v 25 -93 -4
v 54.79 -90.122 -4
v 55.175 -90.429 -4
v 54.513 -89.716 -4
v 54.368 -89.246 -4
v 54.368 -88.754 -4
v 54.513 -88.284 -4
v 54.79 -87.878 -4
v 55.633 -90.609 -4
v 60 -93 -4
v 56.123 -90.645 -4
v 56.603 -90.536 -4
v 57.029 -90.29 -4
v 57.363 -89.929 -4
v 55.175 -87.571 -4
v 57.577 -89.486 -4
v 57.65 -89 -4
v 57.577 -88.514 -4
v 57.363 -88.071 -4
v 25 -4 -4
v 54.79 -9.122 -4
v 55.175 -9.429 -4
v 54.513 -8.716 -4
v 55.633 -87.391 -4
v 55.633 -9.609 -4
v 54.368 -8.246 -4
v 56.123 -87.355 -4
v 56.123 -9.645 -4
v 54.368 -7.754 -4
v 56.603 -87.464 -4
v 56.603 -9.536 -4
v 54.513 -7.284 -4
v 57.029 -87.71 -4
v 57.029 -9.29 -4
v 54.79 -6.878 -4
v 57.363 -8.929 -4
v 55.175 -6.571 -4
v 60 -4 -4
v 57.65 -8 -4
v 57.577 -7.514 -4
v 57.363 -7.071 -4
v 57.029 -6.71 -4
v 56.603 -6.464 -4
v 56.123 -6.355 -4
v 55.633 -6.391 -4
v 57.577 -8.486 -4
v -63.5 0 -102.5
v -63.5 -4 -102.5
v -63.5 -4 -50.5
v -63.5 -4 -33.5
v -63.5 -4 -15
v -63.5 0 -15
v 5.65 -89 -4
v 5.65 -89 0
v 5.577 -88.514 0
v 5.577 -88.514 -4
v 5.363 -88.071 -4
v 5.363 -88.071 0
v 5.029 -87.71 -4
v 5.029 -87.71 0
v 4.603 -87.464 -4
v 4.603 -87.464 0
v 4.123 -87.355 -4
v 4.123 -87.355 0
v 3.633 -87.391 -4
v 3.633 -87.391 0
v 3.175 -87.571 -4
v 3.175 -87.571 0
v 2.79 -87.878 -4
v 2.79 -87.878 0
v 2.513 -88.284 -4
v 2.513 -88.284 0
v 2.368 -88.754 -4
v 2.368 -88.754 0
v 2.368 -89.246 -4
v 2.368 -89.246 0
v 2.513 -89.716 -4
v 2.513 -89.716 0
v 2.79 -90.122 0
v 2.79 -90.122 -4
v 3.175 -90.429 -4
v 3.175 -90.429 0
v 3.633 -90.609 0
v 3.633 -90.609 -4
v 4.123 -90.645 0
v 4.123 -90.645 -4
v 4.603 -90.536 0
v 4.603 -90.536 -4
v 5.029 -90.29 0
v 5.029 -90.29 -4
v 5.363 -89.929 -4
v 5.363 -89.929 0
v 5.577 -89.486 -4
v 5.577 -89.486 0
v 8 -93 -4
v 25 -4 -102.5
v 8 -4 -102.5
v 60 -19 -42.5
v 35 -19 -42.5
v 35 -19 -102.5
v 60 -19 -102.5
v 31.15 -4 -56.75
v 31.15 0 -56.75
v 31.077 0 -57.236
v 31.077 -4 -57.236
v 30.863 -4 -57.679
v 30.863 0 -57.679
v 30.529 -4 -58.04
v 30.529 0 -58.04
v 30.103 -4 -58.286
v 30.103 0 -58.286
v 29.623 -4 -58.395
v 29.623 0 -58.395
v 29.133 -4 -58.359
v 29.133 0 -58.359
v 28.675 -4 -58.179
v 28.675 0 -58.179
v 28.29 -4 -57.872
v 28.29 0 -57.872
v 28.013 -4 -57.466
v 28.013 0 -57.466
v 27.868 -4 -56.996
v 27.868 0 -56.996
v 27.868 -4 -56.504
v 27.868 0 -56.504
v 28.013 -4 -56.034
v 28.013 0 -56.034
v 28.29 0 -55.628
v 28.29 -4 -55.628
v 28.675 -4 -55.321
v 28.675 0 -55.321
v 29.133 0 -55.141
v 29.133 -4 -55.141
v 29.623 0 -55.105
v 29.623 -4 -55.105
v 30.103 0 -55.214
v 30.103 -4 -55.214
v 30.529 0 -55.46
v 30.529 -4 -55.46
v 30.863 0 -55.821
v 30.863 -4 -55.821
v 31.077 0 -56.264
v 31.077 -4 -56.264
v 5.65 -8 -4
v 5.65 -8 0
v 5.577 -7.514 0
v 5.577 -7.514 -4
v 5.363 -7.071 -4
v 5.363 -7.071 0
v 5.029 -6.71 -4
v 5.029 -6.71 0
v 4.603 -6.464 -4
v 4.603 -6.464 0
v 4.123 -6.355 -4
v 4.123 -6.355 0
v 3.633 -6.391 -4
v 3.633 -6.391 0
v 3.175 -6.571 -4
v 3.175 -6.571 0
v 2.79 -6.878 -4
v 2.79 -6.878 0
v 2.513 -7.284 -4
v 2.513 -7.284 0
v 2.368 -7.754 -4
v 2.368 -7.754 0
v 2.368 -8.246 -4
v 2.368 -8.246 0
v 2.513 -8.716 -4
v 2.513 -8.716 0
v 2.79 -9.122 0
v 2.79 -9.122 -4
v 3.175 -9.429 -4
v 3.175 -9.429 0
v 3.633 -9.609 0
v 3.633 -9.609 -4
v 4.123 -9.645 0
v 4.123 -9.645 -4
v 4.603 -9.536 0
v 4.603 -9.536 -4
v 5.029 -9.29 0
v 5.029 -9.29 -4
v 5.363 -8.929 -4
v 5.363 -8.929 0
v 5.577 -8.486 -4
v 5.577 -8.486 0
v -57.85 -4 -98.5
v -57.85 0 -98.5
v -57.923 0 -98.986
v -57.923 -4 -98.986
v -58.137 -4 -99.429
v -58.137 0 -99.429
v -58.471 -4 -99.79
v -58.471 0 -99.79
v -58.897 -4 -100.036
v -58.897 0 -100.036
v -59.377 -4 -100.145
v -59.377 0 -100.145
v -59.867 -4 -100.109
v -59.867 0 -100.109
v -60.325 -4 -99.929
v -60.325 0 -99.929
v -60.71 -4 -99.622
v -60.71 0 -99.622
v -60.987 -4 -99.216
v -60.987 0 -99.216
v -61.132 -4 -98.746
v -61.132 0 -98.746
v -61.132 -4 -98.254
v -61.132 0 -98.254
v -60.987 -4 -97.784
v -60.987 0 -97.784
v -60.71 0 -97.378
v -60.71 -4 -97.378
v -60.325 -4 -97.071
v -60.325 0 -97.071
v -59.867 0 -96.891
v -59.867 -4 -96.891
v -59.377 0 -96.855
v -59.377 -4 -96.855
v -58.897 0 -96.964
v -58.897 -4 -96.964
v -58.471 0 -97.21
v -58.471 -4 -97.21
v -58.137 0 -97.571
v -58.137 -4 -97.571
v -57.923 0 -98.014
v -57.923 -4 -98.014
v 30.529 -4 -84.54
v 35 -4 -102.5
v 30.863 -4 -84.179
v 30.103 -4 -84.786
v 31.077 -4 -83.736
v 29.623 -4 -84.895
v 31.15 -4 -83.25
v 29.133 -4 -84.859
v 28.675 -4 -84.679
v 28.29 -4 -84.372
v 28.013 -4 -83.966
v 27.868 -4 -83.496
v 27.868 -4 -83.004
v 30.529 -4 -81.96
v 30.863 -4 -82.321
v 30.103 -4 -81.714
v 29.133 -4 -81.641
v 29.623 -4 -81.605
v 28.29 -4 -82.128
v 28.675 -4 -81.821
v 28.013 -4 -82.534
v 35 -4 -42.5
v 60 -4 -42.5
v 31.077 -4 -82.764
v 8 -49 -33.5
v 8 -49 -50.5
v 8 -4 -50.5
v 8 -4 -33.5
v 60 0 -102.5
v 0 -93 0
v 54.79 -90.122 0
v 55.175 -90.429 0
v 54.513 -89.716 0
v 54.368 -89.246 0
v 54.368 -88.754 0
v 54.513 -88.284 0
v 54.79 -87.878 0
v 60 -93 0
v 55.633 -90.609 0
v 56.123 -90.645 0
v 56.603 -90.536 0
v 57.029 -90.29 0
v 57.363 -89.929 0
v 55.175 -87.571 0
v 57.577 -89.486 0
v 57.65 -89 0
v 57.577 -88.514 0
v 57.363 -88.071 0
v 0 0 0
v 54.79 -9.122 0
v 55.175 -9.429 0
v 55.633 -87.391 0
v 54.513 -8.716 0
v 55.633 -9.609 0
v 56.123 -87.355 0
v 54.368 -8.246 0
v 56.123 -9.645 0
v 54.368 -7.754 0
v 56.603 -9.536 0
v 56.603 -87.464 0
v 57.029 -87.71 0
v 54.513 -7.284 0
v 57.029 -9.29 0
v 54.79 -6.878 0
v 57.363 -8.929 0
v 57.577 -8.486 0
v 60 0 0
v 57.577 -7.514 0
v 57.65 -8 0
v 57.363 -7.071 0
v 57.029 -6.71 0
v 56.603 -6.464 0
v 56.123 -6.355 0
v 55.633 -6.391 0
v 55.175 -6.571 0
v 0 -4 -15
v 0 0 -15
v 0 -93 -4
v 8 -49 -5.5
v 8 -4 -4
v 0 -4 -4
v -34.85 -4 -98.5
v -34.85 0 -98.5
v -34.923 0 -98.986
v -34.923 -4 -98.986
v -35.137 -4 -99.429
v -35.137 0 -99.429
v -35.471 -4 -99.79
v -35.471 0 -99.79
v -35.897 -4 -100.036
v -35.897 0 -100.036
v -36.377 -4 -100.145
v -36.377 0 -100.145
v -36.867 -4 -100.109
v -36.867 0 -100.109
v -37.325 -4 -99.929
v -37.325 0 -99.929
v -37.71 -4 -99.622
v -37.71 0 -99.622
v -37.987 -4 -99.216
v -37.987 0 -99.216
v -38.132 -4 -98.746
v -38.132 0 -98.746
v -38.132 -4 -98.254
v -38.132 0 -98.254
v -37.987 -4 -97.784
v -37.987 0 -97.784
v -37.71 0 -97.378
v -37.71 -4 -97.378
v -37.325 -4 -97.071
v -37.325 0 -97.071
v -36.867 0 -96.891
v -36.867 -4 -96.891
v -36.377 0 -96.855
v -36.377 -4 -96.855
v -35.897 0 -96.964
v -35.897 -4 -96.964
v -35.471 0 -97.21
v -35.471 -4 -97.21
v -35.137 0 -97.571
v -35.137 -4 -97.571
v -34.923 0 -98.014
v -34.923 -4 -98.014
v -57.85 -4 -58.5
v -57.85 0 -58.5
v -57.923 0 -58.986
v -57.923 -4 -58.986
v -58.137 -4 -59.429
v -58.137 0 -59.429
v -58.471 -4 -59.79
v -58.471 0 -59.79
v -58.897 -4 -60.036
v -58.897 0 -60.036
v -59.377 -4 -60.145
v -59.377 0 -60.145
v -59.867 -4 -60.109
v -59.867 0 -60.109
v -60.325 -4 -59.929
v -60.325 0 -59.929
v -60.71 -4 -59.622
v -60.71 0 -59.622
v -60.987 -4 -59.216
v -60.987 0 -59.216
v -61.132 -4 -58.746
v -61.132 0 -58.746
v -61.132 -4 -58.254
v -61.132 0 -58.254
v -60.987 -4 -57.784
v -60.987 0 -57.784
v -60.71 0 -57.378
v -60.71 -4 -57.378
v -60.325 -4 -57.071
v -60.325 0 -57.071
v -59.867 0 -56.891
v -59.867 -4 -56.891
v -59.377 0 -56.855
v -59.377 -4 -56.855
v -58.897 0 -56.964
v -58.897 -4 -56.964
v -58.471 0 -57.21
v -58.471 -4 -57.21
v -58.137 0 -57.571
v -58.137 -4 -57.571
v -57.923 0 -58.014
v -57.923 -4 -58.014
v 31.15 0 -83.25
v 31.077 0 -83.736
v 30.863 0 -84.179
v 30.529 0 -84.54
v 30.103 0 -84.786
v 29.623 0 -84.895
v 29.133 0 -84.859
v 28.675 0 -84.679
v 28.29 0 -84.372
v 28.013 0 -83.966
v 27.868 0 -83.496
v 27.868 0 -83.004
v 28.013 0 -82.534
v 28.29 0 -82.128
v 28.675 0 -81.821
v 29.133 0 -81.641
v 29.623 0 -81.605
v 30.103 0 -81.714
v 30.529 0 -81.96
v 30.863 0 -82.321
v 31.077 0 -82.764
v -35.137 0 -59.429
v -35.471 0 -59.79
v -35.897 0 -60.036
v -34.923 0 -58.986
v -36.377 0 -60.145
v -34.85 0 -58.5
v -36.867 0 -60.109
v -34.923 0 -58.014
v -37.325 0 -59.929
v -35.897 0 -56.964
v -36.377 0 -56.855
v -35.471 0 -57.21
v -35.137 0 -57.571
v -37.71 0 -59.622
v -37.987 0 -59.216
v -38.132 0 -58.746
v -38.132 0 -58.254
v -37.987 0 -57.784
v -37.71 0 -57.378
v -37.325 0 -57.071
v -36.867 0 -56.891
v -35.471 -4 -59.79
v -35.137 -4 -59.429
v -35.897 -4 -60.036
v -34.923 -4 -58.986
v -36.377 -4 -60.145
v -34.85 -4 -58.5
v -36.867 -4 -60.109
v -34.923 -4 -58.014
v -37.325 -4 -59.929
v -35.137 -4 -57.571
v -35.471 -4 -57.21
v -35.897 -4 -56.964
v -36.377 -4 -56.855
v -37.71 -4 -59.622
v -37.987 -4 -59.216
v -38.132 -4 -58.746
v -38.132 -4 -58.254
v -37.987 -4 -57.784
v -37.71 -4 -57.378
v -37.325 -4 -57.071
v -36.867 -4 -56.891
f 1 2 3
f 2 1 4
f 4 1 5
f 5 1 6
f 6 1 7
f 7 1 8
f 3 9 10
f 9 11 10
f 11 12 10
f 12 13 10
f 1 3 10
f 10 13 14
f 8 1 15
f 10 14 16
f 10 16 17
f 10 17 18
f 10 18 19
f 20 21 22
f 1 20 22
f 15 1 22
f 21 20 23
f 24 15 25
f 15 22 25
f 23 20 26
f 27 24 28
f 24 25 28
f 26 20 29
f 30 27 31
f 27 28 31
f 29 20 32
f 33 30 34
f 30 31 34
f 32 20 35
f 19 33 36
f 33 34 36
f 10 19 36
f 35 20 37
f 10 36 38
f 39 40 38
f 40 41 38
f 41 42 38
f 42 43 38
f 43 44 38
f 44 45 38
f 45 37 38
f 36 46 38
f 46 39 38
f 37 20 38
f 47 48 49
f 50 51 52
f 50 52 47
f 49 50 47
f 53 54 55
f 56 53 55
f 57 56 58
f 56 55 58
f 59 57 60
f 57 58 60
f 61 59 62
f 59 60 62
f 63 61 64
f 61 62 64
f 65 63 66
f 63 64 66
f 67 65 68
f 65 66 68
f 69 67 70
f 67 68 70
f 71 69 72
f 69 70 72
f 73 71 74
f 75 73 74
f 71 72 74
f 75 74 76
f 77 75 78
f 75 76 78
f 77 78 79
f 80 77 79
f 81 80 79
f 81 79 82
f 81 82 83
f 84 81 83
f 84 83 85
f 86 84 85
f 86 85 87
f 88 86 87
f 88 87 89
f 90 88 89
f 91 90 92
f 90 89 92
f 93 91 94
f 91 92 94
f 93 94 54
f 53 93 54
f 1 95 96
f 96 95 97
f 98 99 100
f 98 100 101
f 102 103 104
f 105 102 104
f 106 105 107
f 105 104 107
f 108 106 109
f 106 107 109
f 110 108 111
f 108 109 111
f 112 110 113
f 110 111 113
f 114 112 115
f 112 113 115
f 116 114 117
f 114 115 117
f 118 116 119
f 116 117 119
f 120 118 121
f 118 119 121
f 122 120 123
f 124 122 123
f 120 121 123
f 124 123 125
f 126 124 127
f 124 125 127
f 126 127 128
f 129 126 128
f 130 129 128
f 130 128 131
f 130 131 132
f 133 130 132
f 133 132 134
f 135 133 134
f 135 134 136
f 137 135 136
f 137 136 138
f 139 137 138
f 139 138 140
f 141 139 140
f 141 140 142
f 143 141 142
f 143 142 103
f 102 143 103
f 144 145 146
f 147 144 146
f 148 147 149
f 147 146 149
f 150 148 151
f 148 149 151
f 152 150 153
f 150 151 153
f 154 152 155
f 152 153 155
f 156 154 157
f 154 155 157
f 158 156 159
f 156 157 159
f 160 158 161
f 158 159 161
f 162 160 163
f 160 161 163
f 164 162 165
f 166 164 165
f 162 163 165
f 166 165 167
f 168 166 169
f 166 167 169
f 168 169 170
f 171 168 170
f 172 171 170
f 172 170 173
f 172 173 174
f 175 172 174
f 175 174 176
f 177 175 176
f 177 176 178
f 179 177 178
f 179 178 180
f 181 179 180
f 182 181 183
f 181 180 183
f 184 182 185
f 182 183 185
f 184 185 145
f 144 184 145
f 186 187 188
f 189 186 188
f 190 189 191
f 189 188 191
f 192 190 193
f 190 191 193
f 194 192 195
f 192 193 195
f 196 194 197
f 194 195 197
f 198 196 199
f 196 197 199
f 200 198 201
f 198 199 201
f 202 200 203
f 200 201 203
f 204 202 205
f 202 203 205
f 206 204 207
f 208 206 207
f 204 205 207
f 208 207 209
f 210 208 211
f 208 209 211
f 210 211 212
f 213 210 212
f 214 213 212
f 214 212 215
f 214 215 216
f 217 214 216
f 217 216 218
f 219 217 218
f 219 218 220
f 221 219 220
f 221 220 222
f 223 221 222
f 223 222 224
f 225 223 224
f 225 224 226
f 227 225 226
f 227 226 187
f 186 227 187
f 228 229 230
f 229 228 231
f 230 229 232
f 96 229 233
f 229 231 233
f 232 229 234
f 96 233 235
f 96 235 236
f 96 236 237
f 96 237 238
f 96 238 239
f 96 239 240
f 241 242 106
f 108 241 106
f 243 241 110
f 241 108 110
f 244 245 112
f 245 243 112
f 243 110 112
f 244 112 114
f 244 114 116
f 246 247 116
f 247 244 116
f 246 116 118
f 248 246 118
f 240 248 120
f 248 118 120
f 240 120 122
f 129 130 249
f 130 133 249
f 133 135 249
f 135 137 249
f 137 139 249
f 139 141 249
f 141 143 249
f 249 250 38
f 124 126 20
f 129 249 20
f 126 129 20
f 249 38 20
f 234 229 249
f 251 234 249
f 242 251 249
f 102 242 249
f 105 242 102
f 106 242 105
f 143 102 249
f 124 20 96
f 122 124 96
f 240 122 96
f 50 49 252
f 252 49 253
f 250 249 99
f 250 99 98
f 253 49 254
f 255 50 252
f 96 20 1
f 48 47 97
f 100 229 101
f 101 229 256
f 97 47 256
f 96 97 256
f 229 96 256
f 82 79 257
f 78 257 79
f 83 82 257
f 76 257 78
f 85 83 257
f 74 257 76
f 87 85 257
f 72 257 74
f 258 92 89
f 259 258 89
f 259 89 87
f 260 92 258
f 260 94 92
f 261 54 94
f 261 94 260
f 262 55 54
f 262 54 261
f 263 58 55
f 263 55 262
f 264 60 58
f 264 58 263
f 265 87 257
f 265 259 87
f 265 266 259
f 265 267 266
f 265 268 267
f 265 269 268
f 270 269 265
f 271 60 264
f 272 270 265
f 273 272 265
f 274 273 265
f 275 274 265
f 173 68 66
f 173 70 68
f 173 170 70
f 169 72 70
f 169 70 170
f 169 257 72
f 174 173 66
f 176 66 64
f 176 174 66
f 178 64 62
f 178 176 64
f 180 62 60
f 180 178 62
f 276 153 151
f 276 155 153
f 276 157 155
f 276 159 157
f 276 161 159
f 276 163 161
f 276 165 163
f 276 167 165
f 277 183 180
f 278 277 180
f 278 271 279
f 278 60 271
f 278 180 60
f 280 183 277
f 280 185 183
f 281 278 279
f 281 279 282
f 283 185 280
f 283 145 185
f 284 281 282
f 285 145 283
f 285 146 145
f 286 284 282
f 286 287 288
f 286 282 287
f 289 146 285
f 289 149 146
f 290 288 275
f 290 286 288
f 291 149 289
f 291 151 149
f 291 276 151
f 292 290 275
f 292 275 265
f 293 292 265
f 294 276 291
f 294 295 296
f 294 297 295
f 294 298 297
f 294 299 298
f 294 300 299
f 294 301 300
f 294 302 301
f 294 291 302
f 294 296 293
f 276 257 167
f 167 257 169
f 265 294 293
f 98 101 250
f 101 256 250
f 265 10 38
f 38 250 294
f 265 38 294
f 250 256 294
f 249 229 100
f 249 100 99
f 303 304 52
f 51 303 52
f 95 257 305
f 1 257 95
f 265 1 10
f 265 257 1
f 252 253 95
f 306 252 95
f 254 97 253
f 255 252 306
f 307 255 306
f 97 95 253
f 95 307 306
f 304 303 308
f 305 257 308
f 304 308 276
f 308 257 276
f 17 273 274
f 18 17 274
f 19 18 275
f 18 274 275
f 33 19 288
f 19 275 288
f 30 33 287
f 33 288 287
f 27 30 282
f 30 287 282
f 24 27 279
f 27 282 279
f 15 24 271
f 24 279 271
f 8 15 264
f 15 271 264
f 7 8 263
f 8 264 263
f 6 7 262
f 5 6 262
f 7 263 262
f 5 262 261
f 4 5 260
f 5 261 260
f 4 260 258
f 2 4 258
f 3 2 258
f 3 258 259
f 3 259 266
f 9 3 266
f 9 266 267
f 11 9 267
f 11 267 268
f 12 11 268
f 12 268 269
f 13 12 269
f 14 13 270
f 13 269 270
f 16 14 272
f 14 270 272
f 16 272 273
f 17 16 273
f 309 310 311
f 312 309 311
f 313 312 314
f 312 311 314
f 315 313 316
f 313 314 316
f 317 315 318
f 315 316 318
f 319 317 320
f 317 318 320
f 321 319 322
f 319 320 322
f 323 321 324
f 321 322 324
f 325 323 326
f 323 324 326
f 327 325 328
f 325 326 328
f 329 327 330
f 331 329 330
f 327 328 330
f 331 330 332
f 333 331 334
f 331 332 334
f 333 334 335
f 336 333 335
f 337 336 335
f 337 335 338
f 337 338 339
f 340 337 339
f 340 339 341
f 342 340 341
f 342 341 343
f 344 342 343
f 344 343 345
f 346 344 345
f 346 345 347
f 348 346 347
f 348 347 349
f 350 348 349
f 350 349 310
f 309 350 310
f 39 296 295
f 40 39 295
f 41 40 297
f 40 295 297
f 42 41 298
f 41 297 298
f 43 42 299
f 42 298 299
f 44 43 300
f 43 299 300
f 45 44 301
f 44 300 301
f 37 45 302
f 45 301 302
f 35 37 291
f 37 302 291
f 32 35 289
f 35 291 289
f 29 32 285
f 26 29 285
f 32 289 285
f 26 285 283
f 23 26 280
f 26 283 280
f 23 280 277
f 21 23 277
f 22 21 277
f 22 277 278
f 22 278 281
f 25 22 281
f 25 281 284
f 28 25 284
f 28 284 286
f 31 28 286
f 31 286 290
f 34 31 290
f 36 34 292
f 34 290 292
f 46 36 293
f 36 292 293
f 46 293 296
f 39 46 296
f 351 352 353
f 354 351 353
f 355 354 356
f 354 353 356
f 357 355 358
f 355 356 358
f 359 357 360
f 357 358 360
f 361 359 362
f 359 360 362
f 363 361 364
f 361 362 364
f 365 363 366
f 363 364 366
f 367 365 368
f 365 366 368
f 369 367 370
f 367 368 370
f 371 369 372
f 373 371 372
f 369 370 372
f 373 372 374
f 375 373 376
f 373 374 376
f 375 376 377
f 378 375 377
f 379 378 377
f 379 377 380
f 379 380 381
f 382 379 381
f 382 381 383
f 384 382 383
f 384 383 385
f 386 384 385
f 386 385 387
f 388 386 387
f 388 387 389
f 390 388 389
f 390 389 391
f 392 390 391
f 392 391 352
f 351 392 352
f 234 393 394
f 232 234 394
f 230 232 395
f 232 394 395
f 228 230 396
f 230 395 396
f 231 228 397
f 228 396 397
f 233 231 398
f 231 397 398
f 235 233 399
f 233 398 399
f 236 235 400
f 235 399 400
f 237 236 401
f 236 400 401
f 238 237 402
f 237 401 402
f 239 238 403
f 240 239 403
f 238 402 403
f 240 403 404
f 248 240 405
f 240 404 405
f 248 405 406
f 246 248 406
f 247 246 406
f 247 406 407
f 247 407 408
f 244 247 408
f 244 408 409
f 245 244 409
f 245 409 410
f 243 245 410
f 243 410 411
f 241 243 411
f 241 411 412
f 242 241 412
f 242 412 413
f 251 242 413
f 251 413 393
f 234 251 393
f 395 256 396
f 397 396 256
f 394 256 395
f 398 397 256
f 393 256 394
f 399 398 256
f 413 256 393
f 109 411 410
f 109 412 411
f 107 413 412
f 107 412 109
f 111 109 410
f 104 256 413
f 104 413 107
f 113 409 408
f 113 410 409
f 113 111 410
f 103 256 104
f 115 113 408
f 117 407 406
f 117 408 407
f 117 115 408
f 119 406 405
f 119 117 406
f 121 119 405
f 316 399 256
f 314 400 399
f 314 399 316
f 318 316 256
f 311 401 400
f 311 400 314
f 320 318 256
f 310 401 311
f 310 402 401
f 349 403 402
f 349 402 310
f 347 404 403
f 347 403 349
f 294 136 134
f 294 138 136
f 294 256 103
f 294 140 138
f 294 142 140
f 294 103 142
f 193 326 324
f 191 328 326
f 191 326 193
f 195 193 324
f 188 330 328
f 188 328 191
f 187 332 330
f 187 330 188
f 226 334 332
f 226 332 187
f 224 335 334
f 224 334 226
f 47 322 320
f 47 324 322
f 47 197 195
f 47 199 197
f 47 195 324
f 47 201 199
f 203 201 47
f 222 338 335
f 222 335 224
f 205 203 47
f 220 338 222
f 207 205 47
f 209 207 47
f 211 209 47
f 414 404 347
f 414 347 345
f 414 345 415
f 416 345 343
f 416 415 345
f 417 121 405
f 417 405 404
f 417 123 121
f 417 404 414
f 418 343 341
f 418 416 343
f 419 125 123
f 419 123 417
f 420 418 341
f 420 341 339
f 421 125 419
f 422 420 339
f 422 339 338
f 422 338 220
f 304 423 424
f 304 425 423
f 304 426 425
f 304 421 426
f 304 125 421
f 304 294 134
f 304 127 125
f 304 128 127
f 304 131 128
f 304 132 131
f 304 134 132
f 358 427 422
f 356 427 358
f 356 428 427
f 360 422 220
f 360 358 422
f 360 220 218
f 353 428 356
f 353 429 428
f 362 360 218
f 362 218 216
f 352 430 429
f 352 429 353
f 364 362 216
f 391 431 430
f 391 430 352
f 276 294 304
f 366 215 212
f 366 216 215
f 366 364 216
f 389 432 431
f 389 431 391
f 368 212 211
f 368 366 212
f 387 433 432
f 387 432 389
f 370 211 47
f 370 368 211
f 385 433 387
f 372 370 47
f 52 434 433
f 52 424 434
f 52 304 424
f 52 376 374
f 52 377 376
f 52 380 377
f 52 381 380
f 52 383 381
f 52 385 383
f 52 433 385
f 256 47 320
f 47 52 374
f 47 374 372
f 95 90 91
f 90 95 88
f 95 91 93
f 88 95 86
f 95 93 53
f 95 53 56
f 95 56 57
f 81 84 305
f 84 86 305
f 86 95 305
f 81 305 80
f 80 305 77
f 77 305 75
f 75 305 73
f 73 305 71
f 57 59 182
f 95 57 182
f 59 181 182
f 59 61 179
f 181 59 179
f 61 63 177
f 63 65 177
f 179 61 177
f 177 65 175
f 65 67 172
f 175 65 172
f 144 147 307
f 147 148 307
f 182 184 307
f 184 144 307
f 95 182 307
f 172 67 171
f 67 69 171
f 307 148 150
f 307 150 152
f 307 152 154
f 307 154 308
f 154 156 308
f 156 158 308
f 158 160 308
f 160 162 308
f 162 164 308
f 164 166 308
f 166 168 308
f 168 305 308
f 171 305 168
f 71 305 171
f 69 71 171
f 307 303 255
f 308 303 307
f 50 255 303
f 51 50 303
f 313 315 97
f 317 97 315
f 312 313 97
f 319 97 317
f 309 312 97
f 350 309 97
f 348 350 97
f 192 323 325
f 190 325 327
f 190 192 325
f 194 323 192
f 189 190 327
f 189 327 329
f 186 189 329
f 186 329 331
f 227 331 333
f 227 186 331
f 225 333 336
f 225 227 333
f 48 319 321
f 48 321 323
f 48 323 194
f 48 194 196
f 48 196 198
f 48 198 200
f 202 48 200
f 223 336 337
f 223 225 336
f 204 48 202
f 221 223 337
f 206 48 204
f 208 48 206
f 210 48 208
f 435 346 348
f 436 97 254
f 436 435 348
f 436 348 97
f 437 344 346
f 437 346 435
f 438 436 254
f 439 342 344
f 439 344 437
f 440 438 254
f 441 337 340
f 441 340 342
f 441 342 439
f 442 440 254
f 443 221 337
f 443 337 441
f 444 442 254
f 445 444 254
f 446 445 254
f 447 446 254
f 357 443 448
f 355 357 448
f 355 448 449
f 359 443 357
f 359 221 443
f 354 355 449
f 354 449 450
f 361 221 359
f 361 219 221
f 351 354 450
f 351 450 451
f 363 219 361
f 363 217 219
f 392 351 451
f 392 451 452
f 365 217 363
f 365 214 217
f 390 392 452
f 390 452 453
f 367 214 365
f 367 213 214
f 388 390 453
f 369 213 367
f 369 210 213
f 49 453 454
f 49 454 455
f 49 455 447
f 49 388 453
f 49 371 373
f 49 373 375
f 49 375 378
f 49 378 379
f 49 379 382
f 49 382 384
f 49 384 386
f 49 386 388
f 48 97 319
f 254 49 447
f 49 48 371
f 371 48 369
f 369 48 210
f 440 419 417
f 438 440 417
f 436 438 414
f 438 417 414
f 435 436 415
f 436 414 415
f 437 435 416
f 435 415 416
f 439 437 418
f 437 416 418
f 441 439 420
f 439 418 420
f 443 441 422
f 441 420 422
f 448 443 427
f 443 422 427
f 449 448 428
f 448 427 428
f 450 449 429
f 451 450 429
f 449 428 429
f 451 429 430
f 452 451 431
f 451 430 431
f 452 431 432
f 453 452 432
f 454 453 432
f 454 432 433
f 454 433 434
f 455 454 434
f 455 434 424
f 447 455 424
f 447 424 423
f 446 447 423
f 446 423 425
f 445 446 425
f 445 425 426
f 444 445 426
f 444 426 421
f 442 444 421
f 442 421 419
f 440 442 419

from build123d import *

# Parameters (mm, degrees)
SKETCH1_W           = 60
SKETCH1_H           = 93
BOSS_EXTRUDE1_DEPTH = 4
SKETCH3_R           = 1.65
CUT_EXTRUDE1_DEPTH  = 4
SKETCH5_W           = 60
SKETCH5_H           = 4
BOSS_EXTRUDE2_DEPTH = 11
SKETCH6_W           = 123.5
SKETCH6_H           = 4
BOSS_EXTRUDE3_DEPTH = 87.5
SKETCH7_R           = 1.65
CUT_EXTRUDE2_DEPTH  = 87.5
SKETCH10_R          = 1.65
CUT_EXTRUDE3_DEPTH  = 10
SKETCH11_W          = 98.5
SKETCH11_H          = 89
BOSS_EXTRUDE4_DEPTH = 25
SKETCH13_W          = 98.5
SKETCH13_H          = 89
CUT_EXTRUDE5_DEPTH  = 8
CUT_EXTRUDE7_DEPTH  = 20
SKETCH15_W          = 71.5
SKETCH15_H          = 17
BOSS_EXTRUDE6_DEPTH = 45
CUT_EXTRUDE9_DEPTH  = 45
SKETCH17_W          = 25
SKETCH17_H          = 60
BOSS_EXTRUDE7_DEPTH = 15


with BuildPart() as part:
    # Sketch1 → Boss-Extrude1 (new body)
    with BuildSketch(Plane.XY):
        with Locations((30, -46.5)):
            Rectangle(SKETCH1_W, SKETCH1_H)
    extrude(amount=-BOSS_EXTRUDE1_DEPTH)

    # Sketch3 → Cut-Extrude1 (cut)
    with BuildSketch(Plane.XY):
        with Locations((4, -8)):
            Circle(SKETCH3_R)
        with Locations((56, -8)):
            Circle(SKETCH3_R)
        with Locations((4, -89)):
            Circle(SKETCH3_R)
        with Locations((56, -89)):
            Circle(SKETCH3_R)
    extrude(amount=-CUT_EXTRUDE1_DEPTH, mode=Mode.SUBTRACT)

    # Sketch5 → Boss-Extrude2 (add)
    with BuildSketch(Plane(origin=(0, 0, -4), x_dir=(-1, 0, 0), z_dir=(0, 0, -1))):
        with Locations((-30, -2)):
            Rectangle(SKETCH5_W, SKETCH5_H)
    extrude(amount=BOSS_EXTRUDE2_DEPTH)

    # Sketch6 → Boss-Extrude3 (add)
    with BuildSketch(Plane(origin=(0, 0, -15), x_dir=(-1, 0, 0), z_dir=(0, 0, -1))):
        with Locations((1.75, -2)):
            Rectangle(SKETCH6_W, SKETCH6_H)
    extrude(amount=BOSS_EXTRUDE3_DEPTH)

    # Sketch7 → Cut-Extrude2 (cut)
    with BuildSketch(Plane(origin=(0, 0, 0), x_dir=(1, 0, 0), z_dir=(0, 1, 0))):
        with Locations((-59.5, 98.5)):
            Circle(SKETCH7_R)
        with Locations((-36.5, 98.5)):
            Circle(SKETCH7_R)
        with Locations((-59.5, 58.5)):
            Circle(SKETCH7_R)
        with Locations((-36.5, 58.5)):
            Circle(SKETCH7_R)
    extrude(amount=-CUT_EXTRUDE2_DEPTH, mode=Mode.SUBTRACT)

    # Sketch10 → Cut-Extrude3 (cut)
    with BuildSketch(Plane(origin=(0, 0, 0), x_dir=(1, 0, 0), z_dir=(0, 1, 0))):
        with Locations((29.5, 83.25)):
            Circle(SKETCH10_R)
        with Locations((29.5, 56.75)):
            Circle(SKETCH10_R)
    extrude(amount=-CUT_EXTRUDE3_DEPTH, mode=Mode.SUBTRACT)

    # Sketch11 → Boss-Extrude4 (add)
    with BuildSketch(Plane(origin=(0, 0, 0), x_dir=(0, 0, -1), z_dir=(1, 0, 0))):
        with Locations((53.25, -48.5)):
            Rectangle(SKETCH11_W, SKETCH11_H)
    extrude(amount=BOSS_EXTRUDE4_DEPTH)

    # Sketch13 → Cut-Extrude5 (cut)
    with BuildSketch(Plane.ZY):
        with Locations((-53.25, -48.5)):
            Rectangle(SKETCH13_W, SKETCH13_H)
    extrude(amount=-CUT_EXTRUDE5_DEPTH, mode=Mode.SUBTRACT)

    # Sketch14 → Cut-Extrude7 (cut)
    with BuildSketch(Plane.ZY.offset(-8)):
        Polygon((-102.5, -4), (-102.5, -93), (-4, -93), align=None)
    extrude(amount=-CUT_EXTRUDE7_DEPTH, mode=Mode.SUBTRACT)

    # Sketch15 → Boss-Extrude6 (add)
    with BuildSketch(Plane.XZ.offset(4)):
        with Locations((-27.75, -42)):
            Rectangle(SKETCH15_W, SKETCH15_H)
    extrude(amount=BOSS_EXTRUDE6_DEPTH)

    # Sketch16 → Cut-Extrude9 (cut)
    with BuildSketch(Plane(origin=(0, 0, -50.5), x_dir=(-1, 0, 0), z_dir=(0, 0, -1))):
        Polygon((63.5, -4), (-8, -49), (63.5, -49), align=None)
    extrude(amount=-CUT_EXTRUDE9_DEPTH, mode=Mode.SUBTRACT)

    # Sketch17 → Boss-Extrude7 (add)
    with BuildSketch(Plane.XZ.offset(4)):
        with Locations((47.5, -72.5)):
            Rectangle(SKETCH17_W, SKETCH17_H)
    extrude(amount=BOSS_EXTRUDE7_DEPTH)


solid = part.part
